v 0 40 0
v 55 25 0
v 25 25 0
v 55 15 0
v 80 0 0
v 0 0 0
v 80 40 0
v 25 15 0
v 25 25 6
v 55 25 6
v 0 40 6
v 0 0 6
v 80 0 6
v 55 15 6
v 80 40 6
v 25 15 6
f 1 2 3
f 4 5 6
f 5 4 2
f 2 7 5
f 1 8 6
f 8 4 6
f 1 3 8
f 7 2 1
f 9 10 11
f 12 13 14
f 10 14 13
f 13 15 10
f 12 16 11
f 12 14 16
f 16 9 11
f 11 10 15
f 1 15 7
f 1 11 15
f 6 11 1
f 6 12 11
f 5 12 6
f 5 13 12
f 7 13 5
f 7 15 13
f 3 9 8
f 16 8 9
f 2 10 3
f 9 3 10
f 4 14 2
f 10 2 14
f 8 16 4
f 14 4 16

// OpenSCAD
linear_extrude(height = 6)
  difference() {
    polygon([[0,0],[80,0],[80,40],[0,40]]);
    polygon([[25,15],[55,15],[55,25],[25,25]]);
  }
